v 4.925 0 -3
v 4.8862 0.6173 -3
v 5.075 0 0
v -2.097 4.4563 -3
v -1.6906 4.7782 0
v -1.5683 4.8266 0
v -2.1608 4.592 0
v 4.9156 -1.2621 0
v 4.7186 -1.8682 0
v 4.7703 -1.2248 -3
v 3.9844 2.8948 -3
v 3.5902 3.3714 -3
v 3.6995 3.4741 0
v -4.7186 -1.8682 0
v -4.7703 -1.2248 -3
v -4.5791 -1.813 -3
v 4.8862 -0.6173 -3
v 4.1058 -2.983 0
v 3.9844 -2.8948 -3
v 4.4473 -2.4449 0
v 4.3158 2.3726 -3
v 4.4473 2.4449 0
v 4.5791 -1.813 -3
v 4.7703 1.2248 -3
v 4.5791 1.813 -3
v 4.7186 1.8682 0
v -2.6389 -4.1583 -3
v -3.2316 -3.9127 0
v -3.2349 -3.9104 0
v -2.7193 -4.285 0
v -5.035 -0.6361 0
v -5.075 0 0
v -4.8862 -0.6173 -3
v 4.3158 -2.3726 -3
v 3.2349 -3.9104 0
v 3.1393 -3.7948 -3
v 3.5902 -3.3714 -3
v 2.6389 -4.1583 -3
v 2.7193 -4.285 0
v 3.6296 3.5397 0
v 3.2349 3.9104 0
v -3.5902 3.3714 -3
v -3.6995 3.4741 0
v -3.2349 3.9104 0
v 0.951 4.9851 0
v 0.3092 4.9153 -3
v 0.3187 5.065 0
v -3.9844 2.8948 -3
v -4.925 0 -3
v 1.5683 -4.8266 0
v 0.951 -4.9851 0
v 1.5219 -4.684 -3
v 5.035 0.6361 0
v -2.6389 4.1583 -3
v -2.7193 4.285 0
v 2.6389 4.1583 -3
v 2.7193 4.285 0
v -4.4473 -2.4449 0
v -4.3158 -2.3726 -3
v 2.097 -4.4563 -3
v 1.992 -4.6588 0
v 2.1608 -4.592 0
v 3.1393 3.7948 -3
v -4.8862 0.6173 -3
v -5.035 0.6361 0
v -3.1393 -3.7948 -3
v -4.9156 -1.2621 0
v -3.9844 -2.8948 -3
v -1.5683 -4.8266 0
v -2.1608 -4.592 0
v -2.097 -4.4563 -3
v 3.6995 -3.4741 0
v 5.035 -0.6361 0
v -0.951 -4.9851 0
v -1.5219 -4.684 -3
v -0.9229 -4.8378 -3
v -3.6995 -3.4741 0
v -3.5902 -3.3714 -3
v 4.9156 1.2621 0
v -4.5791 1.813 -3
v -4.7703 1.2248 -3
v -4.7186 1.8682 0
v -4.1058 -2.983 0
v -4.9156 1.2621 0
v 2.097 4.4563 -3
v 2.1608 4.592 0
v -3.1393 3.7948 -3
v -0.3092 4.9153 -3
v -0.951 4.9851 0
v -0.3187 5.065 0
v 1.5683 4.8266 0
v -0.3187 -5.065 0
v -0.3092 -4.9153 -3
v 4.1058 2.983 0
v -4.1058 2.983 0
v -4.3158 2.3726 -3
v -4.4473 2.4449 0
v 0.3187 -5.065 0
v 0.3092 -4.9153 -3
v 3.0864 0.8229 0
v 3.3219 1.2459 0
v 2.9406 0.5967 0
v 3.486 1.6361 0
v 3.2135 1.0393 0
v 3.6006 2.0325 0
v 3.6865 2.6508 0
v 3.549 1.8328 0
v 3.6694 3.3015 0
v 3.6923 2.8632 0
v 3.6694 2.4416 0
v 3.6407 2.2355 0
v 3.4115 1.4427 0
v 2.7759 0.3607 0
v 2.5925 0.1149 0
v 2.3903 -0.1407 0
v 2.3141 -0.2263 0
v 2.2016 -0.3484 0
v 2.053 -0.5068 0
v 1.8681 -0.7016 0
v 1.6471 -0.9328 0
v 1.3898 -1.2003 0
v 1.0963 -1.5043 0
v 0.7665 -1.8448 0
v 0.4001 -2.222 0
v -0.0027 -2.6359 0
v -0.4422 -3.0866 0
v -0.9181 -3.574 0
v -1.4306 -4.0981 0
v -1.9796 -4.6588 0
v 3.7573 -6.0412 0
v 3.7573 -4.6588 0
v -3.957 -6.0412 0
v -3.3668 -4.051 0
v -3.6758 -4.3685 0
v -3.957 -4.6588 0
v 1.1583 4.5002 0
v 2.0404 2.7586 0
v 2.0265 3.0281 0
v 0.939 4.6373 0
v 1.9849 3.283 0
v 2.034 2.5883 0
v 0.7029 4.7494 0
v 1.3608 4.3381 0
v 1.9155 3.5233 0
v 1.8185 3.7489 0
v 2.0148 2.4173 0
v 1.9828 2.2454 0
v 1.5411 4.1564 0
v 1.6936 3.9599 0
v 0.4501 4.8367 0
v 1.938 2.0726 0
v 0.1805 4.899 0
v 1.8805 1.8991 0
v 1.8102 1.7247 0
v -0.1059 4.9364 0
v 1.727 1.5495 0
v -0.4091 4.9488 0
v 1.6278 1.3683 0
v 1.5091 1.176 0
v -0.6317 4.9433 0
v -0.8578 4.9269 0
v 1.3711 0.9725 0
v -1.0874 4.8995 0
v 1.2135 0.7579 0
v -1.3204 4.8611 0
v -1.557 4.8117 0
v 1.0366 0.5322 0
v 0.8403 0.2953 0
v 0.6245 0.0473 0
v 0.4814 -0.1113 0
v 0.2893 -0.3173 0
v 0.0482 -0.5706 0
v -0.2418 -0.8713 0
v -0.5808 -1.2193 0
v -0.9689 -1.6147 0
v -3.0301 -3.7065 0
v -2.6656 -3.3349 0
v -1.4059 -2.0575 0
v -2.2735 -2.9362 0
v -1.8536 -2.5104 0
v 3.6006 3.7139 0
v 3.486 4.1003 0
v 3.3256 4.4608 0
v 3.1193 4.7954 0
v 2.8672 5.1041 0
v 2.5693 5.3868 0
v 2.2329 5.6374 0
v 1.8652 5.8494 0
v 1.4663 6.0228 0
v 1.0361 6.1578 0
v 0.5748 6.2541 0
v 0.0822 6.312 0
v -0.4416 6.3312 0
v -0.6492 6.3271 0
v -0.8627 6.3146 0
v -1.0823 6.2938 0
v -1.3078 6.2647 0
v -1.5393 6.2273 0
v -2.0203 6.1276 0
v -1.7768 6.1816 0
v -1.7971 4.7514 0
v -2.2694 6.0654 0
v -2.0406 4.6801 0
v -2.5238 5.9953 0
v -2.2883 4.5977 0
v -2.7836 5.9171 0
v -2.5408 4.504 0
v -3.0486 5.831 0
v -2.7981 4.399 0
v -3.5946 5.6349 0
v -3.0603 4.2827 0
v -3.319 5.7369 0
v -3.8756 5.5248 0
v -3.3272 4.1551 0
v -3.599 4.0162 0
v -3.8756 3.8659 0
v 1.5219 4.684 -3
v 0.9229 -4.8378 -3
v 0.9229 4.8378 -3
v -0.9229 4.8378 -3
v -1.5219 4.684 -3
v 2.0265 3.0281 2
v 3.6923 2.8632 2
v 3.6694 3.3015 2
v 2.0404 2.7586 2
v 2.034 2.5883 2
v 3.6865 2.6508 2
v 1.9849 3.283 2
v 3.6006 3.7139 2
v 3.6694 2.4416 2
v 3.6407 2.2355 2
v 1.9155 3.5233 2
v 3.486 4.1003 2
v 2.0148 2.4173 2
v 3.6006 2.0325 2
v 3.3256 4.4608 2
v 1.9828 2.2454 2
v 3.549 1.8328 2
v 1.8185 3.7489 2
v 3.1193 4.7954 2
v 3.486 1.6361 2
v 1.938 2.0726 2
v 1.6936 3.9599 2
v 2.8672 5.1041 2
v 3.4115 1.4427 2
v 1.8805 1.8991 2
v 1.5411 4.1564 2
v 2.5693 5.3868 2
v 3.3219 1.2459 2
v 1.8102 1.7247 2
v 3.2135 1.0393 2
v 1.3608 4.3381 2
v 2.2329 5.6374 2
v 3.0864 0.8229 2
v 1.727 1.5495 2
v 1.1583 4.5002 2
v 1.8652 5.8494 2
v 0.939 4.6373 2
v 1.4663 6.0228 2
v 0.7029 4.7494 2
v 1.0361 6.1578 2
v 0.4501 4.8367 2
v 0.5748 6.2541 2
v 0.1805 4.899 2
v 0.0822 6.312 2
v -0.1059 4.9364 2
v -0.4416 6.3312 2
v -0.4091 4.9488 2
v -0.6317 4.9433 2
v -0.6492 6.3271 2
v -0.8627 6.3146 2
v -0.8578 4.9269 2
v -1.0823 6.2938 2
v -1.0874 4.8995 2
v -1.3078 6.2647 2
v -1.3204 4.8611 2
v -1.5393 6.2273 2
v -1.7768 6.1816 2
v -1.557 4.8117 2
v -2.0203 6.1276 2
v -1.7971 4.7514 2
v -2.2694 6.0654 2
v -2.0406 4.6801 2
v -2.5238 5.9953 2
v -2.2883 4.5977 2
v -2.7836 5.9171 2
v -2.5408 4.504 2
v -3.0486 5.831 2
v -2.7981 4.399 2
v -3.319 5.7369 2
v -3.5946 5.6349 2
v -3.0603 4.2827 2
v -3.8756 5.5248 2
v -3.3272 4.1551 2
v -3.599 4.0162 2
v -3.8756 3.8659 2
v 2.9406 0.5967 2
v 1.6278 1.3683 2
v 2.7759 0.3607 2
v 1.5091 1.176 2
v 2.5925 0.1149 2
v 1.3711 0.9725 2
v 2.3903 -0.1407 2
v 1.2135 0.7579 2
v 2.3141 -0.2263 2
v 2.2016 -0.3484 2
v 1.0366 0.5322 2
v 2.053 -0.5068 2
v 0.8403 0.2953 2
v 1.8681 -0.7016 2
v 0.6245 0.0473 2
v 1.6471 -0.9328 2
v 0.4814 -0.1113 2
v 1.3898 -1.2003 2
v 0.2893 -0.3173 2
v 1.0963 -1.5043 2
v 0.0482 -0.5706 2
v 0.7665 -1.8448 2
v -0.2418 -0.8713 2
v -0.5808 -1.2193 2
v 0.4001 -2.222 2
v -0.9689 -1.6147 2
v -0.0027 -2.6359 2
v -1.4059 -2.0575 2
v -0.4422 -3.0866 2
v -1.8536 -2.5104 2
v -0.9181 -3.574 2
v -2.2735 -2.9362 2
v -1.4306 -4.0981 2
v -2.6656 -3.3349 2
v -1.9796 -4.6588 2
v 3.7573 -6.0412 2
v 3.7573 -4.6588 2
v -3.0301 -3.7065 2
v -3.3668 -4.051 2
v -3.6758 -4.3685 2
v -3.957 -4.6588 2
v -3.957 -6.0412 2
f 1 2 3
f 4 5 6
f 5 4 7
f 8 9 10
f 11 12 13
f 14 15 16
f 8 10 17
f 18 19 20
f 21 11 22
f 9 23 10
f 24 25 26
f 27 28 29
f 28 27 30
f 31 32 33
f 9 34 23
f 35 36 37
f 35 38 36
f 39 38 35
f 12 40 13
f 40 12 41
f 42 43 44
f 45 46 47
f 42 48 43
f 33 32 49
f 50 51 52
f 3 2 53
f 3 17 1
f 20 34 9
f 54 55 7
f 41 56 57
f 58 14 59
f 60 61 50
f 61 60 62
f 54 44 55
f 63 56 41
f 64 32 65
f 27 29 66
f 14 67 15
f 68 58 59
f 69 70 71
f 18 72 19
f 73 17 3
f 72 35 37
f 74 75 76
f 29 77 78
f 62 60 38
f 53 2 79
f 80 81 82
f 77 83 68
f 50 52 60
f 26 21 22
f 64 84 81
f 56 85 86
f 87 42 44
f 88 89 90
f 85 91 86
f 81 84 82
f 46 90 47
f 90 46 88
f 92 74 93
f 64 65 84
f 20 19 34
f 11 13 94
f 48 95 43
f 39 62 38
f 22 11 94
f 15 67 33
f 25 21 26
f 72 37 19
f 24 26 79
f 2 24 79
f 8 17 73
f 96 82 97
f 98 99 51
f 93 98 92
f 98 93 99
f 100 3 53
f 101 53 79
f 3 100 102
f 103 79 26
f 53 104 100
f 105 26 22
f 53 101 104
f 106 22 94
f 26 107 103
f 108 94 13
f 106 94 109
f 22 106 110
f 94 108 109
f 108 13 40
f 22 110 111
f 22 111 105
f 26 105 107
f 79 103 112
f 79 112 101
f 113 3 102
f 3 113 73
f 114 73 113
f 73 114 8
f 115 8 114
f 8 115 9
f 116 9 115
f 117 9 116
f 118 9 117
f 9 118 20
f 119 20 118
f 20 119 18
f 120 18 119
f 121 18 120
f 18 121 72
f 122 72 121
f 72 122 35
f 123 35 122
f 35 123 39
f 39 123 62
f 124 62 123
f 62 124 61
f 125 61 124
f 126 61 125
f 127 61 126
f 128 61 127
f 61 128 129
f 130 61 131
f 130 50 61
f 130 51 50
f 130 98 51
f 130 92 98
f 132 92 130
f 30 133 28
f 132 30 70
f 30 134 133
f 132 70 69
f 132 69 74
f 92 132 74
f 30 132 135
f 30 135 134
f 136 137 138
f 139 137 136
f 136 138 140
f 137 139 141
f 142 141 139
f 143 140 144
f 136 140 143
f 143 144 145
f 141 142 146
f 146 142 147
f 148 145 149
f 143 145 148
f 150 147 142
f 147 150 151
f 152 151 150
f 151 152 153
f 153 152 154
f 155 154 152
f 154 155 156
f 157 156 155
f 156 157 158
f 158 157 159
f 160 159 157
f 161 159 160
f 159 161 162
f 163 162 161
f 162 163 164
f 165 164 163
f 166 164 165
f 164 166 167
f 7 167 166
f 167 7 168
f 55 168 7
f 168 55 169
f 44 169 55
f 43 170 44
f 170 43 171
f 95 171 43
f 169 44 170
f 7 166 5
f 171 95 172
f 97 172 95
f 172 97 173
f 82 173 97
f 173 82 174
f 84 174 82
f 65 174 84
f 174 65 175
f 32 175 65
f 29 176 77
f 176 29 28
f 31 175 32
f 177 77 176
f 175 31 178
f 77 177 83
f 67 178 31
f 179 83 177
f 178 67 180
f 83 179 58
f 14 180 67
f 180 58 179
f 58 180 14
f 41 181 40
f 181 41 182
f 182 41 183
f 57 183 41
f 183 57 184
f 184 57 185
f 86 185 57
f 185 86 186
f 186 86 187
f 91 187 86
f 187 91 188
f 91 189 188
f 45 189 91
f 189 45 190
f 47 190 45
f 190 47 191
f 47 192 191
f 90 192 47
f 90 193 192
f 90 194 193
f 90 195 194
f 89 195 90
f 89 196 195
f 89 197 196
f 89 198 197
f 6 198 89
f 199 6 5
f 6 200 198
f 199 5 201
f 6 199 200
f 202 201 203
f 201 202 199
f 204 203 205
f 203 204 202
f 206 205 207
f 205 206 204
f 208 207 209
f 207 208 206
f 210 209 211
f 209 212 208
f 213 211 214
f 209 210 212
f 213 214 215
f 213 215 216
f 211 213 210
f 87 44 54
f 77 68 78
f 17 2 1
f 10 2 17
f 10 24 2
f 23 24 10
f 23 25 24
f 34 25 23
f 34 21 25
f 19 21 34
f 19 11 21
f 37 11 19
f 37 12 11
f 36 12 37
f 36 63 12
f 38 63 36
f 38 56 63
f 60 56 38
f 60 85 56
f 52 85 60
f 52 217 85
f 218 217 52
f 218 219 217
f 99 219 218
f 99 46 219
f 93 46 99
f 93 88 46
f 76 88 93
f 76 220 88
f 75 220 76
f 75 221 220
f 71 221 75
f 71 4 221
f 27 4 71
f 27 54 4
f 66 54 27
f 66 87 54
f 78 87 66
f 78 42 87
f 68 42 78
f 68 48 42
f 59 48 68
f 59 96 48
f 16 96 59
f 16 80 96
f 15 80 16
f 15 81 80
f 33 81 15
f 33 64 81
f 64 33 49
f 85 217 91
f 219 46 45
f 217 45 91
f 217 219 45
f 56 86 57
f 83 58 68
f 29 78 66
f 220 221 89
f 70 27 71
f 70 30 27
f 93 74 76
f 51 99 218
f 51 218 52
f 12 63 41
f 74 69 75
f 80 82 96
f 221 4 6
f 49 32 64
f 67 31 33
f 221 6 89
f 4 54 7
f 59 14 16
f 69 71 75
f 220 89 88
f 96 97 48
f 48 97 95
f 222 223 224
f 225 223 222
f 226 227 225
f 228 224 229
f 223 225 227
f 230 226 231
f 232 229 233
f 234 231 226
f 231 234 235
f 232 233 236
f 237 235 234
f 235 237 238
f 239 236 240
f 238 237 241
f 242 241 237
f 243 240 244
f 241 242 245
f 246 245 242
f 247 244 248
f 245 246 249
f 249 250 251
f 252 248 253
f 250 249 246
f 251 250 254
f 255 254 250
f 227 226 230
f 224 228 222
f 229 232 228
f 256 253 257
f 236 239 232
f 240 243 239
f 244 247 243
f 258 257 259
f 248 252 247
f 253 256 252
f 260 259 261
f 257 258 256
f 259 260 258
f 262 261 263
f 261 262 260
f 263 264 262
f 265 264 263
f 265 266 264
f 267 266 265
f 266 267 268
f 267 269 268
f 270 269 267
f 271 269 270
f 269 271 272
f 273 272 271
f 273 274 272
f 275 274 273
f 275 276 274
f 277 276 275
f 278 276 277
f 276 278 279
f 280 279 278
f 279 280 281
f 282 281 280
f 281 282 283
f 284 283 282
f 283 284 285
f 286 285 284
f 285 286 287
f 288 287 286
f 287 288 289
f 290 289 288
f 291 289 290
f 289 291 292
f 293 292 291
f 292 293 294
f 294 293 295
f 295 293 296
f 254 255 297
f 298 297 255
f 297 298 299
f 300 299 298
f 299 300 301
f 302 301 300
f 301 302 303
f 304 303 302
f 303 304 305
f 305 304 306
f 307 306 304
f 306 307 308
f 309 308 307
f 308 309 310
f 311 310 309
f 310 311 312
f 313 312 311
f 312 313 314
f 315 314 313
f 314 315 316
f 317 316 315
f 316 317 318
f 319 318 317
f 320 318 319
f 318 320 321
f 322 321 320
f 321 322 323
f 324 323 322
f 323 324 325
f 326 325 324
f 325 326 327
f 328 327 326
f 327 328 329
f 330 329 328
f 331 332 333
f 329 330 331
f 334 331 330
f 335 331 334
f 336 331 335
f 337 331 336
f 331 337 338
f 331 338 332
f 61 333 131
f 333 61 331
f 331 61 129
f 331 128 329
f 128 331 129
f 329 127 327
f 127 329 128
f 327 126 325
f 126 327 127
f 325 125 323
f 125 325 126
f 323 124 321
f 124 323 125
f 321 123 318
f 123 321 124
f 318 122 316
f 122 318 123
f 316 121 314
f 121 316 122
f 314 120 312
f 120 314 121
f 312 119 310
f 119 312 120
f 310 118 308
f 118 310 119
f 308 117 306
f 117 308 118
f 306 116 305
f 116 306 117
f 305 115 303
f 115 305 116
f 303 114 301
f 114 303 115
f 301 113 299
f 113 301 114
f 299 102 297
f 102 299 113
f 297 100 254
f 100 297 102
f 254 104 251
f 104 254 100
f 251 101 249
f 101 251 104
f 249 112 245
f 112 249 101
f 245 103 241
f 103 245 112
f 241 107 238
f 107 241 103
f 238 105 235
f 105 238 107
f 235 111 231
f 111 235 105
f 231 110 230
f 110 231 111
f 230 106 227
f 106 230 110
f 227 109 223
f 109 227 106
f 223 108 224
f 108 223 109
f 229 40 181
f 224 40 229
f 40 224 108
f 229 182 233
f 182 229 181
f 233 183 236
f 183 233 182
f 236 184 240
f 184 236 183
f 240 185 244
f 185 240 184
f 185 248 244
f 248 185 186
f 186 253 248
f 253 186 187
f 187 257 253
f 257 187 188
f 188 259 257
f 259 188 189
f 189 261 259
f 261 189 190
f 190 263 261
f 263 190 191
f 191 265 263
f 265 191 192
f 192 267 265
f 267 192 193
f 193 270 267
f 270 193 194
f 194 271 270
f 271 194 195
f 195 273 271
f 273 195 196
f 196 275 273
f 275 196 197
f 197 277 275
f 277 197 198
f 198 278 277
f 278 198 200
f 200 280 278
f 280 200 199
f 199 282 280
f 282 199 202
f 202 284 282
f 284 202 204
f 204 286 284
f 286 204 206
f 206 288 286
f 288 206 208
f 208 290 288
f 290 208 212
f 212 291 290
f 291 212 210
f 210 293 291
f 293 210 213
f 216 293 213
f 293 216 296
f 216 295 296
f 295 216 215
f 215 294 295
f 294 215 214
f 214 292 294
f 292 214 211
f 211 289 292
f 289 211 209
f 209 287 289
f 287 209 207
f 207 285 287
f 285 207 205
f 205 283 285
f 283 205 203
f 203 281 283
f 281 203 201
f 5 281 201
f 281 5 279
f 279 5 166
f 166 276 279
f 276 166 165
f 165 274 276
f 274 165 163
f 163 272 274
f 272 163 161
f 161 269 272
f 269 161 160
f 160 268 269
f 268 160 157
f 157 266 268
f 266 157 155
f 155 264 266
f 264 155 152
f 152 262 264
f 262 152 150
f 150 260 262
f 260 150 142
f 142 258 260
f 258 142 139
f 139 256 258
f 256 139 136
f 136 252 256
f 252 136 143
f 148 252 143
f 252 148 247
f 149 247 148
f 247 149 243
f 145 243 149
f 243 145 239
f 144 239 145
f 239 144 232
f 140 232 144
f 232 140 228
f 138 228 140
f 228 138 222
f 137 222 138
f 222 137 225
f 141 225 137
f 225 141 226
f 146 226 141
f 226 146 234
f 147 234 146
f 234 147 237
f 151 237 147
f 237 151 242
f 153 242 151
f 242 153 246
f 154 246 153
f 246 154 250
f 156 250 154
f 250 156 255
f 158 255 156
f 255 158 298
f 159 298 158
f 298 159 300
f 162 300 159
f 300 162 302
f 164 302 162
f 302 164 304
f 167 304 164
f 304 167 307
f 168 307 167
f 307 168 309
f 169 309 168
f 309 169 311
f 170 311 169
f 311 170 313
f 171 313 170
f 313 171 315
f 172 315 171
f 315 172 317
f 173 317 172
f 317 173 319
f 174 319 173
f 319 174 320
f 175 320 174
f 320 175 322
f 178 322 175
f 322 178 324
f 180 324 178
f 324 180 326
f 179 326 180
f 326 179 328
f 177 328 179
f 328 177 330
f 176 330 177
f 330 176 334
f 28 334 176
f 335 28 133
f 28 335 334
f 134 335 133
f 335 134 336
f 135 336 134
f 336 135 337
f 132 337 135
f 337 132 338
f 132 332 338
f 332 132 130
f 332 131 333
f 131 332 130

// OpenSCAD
$fn = 50;


difference() {
	union() {
		translate(v = [0, 0, -3.0000000000]) {
			cylinder(h = 3, r1 = 4.9250000000, r2 = 5.0750000000);
		}
		linear_extrude(height = 2) {
			text(font = "Impact", halign = "center", size = 12, text = "2", valign = "center");
		}
	}
	union();
}
